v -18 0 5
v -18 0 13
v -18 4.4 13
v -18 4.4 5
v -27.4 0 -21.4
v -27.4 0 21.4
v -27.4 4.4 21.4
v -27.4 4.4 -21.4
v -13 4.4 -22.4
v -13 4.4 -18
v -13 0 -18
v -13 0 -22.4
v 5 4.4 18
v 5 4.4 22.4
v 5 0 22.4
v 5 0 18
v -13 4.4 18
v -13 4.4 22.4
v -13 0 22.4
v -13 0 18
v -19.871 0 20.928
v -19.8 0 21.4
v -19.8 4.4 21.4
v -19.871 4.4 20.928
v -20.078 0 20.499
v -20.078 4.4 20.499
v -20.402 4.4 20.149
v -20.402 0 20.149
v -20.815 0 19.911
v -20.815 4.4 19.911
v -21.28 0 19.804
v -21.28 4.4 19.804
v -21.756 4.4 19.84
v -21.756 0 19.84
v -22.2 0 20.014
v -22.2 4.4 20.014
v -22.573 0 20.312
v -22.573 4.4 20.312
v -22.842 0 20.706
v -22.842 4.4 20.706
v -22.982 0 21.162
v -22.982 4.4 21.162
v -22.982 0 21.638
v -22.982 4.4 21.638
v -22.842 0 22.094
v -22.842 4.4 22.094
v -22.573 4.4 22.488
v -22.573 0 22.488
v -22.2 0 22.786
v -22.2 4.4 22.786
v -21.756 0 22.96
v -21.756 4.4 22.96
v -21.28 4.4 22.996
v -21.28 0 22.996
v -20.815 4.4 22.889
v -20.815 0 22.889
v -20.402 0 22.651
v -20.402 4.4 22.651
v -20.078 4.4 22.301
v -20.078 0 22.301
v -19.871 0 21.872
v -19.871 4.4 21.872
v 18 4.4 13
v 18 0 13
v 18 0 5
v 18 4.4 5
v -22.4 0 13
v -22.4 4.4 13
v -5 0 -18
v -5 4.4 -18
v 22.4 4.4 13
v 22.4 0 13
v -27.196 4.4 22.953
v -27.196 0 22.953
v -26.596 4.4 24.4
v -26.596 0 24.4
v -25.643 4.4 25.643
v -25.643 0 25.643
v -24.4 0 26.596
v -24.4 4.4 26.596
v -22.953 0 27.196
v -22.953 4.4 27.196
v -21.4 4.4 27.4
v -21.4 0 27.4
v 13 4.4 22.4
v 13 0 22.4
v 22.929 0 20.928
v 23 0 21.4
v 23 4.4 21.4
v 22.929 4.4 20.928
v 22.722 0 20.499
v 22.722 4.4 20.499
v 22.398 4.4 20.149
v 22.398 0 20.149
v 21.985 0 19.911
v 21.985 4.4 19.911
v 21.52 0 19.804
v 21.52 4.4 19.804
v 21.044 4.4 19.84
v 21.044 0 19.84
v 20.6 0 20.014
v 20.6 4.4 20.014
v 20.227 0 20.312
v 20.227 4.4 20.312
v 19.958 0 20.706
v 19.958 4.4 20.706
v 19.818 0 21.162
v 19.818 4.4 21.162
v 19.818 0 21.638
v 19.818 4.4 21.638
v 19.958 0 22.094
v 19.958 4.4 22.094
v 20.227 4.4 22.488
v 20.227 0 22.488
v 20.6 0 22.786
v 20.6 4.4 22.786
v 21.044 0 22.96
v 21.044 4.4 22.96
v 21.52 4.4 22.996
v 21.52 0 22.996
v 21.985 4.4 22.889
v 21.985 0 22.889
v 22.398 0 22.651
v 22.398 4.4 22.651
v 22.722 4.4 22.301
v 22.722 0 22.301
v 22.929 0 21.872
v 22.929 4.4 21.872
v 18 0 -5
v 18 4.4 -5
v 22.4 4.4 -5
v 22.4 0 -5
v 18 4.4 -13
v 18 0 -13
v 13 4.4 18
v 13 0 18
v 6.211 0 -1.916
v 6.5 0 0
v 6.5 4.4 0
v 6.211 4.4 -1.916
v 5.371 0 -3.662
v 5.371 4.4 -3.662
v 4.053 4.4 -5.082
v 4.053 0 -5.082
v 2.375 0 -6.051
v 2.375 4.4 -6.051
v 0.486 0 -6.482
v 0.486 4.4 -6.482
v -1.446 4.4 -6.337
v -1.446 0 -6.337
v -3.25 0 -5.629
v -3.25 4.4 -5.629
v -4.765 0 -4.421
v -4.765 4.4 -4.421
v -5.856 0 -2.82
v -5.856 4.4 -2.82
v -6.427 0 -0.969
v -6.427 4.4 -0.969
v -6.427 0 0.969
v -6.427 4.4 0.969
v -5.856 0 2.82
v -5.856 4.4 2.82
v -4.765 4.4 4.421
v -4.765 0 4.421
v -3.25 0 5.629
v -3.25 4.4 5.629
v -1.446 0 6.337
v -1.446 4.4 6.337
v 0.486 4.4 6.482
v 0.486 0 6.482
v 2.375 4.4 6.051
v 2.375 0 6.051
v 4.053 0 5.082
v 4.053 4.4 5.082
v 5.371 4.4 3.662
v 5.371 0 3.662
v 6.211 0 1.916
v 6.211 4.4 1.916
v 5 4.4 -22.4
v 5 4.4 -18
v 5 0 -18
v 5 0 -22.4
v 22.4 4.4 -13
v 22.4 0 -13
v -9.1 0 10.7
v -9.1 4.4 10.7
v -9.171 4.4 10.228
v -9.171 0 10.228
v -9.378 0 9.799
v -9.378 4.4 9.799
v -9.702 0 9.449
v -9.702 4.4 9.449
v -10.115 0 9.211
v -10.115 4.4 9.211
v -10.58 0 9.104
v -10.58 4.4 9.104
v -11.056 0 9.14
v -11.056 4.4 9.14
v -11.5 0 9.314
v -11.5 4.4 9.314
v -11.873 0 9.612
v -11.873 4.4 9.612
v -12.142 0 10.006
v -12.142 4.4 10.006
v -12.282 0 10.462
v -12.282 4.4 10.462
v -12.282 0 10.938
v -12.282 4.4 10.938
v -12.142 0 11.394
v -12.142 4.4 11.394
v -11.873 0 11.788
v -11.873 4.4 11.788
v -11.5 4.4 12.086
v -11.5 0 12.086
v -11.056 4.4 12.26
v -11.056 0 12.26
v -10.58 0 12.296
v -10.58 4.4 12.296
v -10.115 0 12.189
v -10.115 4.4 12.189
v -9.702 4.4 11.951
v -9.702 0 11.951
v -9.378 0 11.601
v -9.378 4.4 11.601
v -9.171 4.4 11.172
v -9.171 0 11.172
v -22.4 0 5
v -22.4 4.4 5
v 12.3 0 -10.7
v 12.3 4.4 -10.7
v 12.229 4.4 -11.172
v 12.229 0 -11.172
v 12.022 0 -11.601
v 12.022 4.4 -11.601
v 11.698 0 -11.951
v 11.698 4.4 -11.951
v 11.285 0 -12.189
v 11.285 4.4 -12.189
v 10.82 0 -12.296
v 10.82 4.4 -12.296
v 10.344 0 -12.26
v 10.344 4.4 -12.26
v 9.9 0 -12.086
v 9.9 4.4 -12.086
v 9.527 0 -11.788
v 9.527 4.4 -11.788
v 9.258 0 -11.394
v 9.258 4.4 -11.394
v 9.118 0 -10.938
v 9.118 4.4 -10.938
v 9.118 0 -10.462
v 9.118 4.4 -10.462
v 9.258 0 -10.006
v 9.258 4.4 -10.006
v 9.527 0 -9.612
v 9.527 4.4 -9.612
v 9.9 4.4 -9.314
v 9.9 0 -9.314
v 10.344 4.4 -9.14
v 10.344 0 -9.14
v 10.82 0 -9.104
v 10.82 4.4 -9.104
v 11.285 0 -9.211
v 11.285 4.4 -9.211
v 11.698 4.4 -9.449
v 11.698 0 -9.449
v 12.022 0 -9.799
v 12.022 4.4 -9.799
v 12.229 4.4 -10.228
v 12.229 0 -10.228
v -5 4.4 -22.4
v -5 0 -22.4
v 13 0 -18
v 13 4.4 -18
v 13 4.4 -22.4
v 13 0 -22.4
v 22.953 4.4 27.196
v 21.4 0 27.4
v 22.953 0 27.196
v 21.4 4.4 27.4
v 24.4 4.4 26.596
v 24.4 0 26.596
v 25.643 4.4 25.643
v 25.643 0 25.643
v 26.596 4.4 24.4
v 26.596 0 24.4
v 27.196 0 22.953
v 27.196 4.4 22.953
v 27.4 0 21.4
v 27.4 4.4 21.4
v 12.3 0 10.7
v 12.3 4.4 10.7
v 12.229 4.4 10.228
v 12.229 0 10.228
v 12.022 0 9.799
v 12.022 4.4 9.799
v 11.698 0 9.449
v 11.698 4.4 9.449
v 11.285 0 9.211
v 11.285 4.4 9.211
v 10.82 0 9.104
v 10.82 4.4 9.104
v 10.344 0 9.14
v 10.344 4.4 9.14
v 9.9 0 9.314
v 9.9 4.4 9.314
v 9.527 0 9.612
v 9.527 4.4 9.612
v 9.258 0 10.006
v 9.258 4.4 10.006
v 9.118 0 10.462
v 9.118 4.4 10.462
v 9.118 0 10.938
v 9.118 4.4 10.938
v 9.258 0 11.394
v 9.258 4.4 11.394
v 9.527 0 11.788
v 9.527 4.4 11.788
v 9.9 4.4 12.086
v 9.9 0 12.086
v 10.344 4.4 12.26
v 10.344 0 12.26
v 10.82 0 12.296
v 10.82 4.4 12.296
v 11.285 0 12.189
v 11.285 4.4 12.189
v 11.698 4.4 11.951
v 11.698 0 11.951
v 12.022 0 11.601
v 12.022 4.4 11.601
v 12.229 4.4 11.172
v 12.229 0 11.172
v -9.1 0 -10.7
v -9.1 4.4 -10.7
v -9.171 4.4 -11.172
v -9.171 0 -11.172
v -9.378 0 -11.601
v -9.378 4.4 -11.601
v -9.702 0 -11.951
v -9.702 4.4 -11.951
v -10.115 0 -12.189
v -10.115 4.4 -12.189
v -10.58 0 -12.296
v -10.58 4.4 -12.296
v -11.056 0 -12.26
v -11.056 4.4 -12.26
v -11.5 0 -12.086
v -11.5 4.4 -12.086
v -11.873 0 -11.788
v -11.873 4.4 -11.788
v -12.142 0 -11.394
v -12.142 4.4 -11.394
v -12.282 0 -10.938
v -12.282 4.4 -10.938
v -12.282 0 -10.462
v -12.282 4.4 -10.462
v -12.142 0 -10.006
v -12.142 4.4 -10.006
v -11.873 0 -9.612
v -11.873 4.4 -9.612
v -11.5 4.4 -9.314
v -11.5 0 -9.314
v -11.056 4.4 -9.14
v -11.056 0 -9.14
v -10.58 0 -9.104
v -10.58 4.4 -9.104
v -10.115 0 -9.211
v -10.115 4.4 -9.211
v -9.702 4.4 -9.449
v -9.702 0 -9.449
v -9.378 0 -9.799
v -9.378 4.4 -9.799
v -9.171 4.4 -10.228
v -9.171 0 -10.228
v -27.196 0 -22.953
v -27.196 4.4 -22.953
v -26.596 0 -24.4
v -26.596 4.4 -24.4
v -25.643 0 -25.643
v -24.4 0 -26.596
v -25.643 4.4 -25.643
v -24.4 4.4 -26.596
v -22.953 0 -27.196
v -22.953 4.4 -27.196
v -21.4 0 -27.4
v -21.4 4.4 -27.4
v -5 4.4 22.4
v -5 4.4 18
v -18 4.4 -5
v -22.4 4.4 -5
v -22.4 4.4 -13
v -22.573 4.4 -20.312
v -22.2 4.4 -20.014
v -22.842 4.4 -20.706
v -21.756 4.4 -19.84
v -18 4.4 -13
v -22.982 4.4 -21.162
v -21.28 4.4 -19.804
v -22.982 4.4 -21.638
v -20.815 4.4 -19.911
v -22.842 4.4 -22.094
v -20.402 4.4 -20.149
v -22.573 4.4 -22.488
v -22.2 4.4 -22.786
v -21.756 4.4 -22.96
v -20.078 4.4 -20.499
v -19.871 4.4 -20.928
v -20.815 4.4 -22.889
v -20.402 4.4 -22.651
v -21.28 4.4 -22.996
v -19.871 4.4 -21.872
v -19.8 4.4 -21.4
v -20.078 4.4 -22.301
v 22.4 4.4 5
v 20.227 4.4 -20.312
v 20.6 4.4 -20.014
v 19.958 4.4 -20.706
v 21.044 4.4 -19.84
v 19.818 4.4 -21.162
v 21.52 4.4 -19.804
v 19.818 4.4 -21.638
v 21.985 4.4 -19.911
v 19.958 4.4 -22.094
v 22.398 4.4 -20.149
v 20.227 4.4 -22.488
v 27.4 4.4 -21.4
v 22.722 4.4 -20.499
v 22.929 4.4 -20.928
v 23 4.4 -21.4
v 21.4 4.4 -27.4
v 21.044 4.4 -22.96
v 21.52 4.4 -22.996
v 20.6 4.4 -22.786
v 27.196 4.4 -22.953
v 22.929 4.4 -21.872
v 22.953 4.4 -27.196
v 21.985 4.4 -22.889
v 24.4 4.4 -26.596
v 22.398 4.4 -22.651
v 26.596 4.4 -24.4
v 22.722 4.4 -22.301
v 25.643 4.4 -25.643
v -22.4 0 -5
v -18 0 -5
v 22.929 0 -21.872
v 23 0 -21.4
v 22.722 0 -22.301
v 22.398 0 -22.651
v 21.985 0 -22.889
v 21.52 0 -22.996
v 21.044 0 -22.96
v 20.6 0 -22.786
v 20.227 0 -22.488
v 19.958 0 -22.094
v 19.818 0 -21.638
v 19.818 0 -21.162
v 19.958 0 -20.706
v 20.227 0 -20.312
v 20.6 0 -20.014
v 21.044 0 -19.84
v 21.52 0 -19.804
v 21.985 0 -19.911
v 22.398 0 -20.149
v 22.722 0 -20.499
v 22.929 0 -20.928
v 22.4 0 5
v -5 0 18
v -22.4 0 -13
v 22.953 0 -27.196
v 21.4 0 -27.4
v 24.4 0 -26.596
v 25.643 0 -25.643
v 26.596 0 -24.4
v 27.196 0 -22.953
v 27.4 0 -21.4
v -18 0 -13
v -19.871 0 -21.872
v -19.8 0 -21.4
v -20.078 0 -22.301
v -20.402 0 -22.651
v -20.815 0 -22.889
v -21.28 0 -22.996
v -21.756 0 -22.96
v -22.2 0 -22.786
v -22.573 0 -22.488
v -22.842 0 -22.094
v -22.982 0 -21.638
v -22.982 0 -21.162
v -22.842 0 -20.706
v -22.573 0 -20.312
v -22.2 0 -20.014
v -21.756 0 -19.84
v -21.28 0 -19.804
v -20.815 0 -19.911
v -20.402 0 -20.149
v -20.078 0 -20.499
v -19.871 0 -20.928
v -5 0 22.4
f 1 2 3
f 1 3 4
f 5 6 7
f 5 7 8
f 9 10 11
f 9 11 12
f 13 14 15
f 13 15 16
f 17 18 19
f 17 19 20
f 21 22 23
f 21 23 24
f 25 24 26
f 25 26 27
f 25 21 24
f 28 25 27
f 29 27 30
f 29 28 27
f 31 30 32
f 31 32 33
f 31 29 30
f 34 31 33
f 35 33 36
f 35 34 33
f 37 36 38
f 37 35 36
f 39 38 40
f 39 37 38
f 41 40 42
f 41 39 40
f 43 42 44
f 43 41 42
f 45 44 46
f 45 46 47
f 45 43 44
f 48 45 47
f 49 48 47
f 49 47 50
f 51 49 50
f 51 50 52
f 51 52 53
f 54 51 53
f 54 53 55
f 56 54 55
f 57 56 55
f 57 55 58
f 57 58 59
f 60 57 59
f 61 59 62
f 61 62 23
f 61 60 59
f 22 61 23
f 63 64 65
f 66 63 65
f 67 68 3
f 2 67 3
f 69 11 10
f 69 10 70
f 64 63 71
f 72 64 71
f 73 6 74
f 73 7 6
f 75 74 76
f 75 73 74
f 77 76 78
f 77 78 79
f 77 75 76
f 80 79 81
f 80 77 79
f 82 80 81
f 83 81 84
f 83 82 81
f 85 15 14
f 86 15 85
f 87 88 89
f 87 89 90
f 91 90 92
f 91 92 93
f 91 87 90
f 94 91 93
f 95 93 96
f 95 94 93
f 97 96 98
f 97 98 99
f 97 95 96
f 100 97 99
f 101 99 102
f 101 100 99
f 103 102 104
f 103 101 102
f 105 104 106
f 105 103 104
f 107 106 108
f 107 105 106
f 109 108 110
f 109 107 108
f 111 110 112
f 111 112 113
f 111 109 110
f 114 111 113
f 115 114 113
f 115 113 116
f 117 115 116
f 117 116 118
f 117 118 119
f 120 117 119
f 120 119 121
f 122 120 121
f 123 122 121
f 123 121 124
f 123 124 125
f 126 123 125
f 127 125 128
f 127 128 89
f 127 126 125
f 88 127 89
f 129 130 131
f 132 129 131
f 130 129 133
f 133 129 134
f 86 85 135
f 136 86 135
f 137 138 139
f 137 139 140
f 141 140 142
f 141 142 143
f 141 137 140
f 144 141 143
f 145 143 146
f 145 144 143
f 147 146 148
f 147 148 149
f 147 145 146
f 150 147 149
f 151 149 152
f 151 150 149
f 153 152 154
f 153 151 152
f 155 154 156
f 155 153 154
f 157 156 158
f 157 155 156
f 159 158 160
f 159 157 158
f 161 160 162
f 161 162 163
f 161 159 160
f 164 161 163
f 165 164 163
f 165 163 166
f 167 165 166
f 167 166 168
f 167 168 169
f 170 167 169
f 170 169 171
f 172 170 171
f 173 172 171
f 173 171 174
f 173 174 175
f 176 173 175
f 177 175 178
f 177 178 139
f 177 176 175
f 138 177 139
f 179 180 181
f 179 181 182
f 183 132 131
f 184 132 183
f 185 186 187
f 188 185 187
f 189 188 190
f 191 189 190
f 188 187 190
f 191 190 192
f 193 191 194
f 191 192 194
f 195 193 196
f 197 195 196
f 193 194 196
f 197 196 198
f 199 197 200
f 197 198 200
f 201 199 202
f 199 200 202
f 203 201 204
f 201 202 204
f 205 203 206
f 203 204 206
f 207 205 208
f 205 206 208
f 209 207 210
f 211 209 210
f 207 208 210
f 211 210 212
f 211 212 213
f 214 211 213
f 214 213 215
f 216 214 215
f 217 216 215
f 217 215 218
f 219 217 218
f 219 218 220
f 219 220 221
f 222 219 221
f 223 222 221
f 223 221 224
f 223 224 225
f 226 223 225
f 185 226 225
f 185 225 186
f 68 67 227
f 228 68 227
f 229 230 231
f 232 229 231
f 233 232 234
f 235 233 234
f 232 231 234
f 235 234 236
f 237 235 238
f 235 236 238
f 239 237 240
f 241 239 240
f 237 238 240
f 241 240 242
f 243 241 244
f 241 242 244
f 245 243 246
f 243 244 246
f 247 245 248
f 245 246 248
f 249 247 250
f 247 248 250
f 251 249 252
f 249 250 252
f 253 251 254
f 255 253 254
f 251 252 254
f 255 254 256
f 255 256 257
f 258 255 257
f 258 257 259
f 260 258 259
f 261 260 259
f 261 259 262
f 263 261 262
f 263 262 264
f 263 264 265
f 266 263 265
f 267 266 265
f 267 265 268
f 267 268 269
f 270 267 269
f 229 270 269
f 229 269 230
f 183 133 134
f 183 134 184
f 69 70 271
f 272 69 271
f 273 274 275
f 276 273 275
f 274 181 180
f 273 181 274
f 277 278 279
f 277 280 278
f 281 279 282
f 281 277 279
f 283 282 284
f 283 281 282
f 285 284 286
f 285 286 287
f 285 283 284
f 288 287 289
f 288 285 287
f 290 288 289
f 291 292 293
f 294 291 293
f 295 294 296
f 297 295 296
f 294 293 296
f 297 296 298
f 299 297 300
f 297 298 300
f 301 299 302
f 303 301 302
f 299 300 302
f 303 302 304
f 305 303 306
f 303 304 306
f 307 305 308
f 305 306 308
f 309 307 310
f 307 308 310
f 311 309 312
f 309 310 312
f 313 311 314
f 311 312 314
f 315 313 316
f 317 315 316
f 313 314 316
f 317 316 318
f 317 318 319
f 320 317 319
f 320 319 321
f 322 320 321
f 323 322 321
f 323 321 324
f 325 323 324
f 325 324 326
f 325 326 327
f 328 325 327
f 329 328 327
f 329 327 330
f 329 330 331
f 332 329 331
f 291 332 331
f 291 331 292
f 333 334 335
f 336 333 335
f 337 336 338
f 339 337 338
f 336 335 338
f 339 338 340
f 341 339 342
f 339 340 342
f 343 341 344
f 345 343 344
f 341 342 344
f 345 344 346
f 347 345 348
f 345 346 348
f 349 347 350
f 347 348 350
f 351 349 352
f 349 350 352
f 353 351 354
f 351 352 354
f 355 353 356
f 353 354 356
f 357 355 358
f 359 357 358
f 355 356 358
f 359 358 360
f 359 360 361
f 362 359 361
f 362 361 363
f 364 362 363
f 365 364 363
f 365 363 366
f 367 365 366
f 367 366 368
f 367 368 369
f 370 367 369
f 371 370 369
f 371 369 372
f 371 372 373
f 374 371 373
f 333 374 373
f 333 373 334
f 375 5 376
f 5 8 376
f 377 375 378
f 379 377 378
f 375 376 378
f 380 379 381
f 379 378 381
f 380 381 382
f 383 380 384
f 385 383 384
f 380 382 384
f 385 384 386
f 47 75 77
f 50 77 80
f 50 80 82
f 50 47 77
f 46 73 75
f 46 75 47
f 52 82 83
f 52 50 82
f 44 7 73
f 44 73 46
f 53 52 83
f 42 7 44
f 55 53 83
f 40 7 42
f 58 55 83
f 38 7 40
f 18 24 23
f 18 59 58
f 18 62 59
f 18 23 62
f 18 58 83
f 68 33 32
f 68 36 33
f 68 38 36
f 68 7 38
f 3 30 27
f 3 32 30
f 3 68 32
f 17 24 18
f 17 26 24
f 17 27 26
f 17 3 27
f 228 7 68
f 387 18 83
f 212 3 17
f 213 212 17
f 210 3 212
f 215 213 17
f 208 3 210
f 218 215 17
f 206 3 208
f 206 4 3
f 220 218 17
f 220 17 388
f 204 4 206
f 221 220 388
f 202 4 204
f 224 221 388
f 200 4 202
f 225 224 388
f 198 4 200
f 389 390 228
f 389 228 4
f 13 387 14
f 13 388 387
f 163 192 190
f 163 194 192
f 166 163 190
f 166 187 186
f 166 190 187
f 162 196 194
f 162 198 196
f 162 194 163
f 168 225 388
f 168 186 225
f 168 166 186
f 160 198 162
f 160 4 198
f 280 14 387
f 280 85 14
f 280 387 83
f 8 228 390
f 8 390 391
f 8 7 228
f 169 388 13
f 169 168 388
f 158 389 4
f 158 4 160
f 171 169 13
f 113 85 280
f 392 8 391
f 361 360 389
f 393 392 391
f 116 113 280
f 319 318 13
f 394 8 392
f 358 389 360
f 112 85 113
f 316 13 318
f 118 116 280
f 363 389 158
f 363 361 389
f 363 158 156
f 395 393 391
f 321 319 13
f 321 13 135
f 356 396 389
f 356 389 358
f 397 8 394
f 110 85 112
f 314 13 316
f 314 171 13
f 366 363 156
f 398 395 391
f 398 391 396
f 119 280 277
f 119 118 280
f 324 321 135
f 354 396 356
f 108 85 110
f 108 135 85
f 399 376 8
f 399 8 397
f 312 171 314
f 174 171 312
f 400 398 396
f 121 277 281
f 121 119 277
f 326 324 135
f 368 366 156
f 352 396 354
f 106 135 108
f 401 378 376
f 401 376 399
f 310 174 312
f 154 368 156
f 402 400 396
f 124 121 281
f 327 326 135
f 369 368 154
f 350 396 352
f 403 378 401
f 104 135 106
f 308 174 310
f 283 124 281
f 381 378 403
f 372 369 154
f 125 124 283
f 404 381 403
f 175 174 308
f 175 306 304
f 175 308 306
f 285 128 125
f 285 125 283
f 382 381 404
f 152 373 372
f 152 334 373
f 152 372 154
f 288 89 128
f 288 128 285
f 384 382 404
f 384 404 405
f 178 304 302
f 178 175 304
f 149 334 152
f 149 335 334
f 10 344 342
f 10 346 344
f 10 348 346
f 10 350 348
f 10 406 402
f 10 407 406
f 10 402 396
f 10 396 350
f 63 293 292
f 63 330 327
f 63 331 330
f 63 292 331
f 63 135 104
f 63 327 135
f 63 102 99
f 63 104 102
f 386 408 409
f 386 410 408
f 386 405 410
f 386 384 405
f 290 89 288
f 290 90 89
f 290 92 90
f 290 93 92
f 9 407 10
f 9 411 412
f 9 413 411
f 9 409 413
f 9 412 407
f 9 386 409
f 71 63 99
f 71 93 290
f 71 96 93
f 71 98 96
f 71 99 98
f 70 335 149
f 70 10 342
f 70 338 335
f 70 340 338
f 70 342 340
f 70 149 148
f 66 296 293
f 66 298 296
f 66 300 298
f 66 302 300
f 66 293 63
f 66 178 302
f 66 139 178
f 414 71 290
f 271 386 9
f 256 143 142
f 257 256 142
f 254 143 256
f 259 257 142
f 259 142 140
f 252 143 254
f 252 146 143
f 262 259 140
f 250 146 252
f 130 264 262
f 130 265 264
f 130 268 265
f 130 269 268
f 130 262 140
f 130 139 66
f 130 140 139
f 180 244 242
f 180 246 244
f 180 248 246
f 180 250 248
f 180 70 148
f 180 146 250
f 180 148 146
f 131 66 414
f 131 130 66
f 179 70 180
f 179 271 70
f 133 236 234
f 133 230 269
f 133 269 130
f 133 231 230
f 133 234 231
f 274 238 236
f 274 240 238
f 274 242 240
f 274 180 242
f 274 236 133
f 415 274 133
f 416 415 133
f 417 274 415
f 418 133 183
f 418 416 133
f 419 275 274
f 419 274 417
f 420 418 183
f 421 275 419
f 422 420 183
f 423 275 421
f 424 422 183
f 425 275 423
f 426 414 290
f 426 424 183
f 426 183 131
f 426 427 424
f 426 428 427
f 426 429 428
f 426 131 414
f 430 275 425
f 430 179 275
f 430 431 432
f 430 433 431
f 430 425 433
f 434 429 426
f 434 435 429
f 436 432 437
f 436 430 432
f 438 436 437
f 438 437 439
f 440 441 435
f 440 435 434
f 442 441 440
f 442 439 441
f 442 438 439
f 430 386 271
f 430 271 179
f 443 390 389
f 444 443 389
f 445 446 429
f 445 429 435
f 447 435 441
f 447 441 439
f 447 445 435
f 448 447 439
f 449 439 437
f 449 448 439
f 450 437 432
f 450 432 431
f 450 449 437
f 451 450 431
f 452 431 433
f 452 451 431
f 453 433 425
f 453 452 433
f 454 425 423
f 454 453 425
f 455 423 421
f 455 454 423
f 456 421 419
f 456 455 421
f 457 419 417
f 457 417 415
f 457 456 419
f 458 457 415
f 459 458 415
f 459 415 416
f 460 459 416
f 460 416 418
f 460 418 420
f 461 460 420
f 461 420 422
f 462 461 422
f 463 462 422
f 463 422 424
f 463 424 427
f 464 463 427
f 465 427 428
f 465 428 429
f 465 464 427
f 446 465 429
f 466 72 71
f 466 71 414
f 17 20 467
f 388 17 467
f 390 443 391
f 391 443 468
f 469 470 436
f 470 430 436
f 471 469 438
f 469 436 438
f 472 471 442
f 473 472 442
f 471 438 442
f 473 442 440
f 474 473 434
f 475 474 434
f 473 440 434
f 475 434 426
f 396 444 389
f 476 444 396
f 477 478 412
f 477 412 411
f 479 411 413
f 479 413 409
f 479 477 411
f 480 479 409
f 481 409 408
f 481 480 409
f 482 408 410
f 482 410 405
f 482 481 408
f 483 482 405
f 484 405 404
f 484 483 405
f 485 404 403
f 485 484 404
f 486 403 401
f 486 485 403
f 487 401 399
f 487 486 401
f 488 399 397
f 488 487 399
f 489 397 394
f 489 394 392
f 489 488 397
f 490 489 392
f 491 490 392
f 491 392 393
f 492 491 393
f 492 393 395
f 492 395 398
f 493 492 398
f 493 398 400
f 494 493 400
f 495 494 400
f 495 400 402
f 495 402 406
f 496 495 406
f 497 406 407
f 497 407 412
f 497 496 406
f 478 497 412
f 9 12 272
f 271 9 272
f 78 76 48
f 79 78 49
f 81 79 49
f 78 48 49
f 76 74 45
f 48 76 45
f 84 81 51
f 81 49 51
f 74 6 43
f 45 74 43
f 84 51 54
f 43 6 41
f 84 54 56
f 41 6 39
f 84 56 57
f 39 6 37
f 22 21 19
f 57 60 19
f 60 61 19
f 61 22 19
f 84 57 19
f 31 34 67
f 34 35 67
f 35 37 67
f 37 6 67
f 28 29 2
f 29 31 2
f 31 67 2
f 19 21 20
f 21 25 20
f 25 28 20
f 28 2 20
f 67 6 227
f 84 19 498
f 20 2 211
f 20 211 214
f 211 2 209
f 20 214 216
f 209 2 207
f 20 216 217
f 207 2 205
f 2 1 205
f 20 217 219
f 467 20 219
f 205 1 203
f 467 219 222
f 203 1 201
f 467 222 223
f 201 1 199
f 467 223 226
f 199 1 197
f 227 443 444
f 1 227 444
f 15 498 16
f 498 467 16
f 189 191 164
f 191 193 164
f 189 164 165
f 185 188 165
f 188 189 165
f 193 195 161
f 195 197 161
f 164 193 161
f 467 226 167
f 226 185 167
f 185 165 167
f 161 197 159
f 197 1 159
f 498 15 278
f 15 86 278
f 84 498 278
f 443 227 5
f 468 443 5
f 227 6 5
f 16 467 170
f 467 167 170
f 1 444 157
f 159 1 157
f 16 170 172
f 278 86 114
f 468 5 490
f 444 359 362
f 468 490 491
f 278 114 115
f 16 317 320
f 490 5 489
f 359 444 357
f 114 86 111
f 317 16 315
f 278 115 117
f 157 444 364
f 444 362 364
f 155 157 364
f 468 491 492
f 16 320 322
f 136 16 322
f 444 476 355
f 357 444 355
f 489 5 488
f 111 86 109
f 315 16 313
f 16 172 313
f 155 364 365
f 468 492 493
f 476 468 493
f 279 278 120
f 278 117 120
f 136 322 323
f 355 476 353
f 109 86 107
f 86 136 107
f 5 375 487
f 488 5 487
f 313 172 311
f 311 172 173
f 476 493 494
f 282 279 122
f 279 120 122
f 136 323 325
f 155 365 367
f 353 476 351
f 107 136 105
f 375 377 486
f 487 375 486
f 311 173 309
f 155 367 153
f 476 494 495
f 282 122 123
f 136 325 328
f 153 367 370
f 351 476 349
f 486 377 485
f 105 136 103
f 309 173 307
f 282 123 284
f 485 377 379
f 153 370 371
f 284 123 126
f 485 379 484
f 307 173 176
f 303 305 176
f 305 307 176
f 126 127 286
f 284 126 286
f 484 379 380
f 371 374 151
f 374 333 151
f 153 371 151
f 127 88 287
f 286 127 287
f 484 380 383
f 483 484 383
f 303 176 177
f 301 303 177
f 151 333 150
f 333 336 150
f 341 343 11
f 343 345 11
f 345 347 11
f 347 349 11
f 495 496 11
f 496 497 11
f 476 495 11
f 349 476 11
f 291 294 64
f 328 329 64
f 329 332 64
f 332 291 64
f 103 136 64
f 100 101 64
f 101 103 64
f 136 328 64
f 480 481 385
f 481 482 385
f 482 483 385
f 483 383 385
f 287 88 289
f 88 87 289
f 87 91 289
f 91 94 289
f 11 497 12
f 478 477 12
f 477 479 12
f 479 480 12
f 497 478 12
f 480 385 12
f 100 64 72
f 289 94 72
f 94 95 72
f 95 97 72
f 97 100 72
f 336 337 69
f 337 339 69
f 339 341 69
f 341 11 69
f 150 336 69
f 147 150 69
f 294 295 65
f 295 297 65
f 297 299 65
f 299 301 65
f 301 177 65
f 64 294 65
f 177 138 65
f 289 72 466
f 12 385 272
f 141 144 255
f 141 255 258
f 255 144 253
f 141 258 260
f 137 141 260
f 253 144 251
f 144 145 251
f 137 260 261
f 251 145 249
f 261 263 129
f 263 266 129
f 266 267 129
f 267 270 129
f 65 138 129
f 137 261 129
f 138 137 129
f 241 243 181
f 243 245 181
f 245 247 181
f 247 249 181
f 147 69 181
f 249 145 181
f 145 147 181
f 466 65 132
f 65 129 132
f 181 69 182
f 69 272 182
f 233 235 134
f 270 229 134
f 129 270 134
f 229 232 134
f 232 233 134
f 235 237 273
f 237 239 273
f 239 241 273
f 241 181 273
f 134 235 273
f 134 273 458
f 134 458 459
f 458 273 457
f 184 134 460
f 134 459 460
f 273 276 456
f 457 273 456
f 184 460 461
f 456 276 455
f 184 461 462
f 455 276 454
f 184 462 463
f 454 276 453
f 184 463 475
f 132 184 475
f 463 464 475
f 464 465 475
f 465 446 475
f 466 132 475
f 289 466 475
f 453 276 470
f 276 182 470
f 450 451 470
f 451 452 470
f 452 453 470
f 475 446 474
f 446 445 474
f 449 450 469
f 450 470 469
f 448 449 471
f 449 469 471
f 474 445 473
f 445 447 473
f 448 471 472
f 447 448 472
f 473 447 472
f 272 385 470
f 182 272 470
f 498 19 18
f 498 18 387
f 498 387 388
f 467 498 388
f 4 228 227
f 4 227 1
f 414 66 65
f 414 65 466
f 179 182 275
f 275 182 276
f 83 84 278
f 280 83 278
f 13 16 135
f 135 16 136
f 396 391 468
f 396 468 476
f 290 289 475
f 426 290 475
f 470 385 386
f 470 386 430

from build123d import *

# Parameters (mm, degrees)
SKETCH_1_W          = 54.8
SKETCH_1_H          = 54.8
SKETCH_1_R          = 6.5
SKETCH_1_R_2        = 1.6
SKETCH_1_W_2        = 4.4
SKETCH_1_H_2        = 8
SKETCH_1_W_3        = 8
SKETCH_1_H_3        = 4.4
EXTRUDE_1_DEPTH     = 4.4
FILLET_1_R          = 6
SKETCH_2_R          = 1.6
CUT_EXTRUDE_1_DEPTH = 10


with BuildPart() as part:
    # 草图1 → 凸台-拉伸1 (new body)
    with BuildSketch(Plane(origin=(0, 0, 0), x_dir=(1, 0, 0), z_dir=(0, 1, 0))):
        Rectangle(SKETCH_1_W, SKETCH_1_H)
        Circle(SKETCH_1_R, mode=Mode.SUBTRACT)
        with Locations((21.4, 21.4)):
            Circle(SKETCH_1_R_2, mode=Mode.SUBTRACT)
        with Locations((21.4, -21.4)):
            Circle(SKETCH_1_R_2, mode=Mode.SUBTRACT)
        with Locations((-21.4, -21.4)):
            Circle(SKETCH_1_R_2, mode=Mode.SUBTRACT)
        with Locations((-21.4, 21.4)):
            Circle(SKETCH_1_R_2, mode=Mode.SUBTRACT)
        with Locations((20.2, 9)):
            Rectangle(SKETCH_1_W_2, SKETCH_1_H_2, mode=Mode.SUBTRACT)
        with Locations((20.2, -9)):
            Rectangle(SKETCH_1_W_2, SKETCH_1_H_2, mode=Mode.SUBTRACT)
        with Locations((-20.2, -9)):
            Rectangle(SKETCH_1_W_2, SKETCH_1_H_2, mode=Mode.SUBTRACT)
        with Locations((-20.2, 9)):
            Rectangle(SKETCH_1_W_2, SKETCH_1_H_2, mode=Mode.SUBTRACT)
        with Locations((9, 20.2)):
            Rectangle(SKETCH_1_W_3, SKETCH_1_H_3, mode=Mode.SUBTRACT)
        with Locations((9, -20.2)):
            Rectangle(SKETCH_1_W_3, SKETCH_1_H_3, mode=Mode.SUBTRACT)
        with Locations((-9, -20.2)):
            Rectangle(SKETCH_1_W_3, SKETCH_1_H_3, mode=Mode.SUBTRACT)
        with Locations((-9, 20.2)):
            Rectangle(SKETCH_1_W_3, SKETCH_1_H_3, mode=Mode.SUBTRACT)
    extrude(amount=EXTRUDE_1_DEPTH)

    # 圆角1
    fillet_1_edges = [part.edges().sort_by_distance(p)[0] for p in [
        (27.4, 2.2, 27.4),
        (-27.4, 2.2, 27.4),
        (-27.4, 2.2, -27.4),
        (27.4, 2.2, -27.4),
    ]]
    fillet(fillet_1_edges, radius=FILLET_1_R)

    # 草图2 → 切除-拉伸1 (cut)
    with BuildSketch(Plane(origin=(0, 4.4, 0), x_dir=(1, 0, 0), z_dir=(0, 1, 0))):
        with Locations((10.7, 10.7)):
            Circle(SKETCH_2_R)
        with Locations((10.7, -10.7)):
            Circle(SKETCH_2_R)
        with Locations((-10.7, -10.7)):
            Circle(SKETCH_2_R)
        with Locations((-10.7, 10.7)):
            Circle(SKETCH_2_R)
    extrude(amount=-CUT_EXTRUDE_1_DEPTH, mode=Mode.SUBTRACT)


solid = part.part
